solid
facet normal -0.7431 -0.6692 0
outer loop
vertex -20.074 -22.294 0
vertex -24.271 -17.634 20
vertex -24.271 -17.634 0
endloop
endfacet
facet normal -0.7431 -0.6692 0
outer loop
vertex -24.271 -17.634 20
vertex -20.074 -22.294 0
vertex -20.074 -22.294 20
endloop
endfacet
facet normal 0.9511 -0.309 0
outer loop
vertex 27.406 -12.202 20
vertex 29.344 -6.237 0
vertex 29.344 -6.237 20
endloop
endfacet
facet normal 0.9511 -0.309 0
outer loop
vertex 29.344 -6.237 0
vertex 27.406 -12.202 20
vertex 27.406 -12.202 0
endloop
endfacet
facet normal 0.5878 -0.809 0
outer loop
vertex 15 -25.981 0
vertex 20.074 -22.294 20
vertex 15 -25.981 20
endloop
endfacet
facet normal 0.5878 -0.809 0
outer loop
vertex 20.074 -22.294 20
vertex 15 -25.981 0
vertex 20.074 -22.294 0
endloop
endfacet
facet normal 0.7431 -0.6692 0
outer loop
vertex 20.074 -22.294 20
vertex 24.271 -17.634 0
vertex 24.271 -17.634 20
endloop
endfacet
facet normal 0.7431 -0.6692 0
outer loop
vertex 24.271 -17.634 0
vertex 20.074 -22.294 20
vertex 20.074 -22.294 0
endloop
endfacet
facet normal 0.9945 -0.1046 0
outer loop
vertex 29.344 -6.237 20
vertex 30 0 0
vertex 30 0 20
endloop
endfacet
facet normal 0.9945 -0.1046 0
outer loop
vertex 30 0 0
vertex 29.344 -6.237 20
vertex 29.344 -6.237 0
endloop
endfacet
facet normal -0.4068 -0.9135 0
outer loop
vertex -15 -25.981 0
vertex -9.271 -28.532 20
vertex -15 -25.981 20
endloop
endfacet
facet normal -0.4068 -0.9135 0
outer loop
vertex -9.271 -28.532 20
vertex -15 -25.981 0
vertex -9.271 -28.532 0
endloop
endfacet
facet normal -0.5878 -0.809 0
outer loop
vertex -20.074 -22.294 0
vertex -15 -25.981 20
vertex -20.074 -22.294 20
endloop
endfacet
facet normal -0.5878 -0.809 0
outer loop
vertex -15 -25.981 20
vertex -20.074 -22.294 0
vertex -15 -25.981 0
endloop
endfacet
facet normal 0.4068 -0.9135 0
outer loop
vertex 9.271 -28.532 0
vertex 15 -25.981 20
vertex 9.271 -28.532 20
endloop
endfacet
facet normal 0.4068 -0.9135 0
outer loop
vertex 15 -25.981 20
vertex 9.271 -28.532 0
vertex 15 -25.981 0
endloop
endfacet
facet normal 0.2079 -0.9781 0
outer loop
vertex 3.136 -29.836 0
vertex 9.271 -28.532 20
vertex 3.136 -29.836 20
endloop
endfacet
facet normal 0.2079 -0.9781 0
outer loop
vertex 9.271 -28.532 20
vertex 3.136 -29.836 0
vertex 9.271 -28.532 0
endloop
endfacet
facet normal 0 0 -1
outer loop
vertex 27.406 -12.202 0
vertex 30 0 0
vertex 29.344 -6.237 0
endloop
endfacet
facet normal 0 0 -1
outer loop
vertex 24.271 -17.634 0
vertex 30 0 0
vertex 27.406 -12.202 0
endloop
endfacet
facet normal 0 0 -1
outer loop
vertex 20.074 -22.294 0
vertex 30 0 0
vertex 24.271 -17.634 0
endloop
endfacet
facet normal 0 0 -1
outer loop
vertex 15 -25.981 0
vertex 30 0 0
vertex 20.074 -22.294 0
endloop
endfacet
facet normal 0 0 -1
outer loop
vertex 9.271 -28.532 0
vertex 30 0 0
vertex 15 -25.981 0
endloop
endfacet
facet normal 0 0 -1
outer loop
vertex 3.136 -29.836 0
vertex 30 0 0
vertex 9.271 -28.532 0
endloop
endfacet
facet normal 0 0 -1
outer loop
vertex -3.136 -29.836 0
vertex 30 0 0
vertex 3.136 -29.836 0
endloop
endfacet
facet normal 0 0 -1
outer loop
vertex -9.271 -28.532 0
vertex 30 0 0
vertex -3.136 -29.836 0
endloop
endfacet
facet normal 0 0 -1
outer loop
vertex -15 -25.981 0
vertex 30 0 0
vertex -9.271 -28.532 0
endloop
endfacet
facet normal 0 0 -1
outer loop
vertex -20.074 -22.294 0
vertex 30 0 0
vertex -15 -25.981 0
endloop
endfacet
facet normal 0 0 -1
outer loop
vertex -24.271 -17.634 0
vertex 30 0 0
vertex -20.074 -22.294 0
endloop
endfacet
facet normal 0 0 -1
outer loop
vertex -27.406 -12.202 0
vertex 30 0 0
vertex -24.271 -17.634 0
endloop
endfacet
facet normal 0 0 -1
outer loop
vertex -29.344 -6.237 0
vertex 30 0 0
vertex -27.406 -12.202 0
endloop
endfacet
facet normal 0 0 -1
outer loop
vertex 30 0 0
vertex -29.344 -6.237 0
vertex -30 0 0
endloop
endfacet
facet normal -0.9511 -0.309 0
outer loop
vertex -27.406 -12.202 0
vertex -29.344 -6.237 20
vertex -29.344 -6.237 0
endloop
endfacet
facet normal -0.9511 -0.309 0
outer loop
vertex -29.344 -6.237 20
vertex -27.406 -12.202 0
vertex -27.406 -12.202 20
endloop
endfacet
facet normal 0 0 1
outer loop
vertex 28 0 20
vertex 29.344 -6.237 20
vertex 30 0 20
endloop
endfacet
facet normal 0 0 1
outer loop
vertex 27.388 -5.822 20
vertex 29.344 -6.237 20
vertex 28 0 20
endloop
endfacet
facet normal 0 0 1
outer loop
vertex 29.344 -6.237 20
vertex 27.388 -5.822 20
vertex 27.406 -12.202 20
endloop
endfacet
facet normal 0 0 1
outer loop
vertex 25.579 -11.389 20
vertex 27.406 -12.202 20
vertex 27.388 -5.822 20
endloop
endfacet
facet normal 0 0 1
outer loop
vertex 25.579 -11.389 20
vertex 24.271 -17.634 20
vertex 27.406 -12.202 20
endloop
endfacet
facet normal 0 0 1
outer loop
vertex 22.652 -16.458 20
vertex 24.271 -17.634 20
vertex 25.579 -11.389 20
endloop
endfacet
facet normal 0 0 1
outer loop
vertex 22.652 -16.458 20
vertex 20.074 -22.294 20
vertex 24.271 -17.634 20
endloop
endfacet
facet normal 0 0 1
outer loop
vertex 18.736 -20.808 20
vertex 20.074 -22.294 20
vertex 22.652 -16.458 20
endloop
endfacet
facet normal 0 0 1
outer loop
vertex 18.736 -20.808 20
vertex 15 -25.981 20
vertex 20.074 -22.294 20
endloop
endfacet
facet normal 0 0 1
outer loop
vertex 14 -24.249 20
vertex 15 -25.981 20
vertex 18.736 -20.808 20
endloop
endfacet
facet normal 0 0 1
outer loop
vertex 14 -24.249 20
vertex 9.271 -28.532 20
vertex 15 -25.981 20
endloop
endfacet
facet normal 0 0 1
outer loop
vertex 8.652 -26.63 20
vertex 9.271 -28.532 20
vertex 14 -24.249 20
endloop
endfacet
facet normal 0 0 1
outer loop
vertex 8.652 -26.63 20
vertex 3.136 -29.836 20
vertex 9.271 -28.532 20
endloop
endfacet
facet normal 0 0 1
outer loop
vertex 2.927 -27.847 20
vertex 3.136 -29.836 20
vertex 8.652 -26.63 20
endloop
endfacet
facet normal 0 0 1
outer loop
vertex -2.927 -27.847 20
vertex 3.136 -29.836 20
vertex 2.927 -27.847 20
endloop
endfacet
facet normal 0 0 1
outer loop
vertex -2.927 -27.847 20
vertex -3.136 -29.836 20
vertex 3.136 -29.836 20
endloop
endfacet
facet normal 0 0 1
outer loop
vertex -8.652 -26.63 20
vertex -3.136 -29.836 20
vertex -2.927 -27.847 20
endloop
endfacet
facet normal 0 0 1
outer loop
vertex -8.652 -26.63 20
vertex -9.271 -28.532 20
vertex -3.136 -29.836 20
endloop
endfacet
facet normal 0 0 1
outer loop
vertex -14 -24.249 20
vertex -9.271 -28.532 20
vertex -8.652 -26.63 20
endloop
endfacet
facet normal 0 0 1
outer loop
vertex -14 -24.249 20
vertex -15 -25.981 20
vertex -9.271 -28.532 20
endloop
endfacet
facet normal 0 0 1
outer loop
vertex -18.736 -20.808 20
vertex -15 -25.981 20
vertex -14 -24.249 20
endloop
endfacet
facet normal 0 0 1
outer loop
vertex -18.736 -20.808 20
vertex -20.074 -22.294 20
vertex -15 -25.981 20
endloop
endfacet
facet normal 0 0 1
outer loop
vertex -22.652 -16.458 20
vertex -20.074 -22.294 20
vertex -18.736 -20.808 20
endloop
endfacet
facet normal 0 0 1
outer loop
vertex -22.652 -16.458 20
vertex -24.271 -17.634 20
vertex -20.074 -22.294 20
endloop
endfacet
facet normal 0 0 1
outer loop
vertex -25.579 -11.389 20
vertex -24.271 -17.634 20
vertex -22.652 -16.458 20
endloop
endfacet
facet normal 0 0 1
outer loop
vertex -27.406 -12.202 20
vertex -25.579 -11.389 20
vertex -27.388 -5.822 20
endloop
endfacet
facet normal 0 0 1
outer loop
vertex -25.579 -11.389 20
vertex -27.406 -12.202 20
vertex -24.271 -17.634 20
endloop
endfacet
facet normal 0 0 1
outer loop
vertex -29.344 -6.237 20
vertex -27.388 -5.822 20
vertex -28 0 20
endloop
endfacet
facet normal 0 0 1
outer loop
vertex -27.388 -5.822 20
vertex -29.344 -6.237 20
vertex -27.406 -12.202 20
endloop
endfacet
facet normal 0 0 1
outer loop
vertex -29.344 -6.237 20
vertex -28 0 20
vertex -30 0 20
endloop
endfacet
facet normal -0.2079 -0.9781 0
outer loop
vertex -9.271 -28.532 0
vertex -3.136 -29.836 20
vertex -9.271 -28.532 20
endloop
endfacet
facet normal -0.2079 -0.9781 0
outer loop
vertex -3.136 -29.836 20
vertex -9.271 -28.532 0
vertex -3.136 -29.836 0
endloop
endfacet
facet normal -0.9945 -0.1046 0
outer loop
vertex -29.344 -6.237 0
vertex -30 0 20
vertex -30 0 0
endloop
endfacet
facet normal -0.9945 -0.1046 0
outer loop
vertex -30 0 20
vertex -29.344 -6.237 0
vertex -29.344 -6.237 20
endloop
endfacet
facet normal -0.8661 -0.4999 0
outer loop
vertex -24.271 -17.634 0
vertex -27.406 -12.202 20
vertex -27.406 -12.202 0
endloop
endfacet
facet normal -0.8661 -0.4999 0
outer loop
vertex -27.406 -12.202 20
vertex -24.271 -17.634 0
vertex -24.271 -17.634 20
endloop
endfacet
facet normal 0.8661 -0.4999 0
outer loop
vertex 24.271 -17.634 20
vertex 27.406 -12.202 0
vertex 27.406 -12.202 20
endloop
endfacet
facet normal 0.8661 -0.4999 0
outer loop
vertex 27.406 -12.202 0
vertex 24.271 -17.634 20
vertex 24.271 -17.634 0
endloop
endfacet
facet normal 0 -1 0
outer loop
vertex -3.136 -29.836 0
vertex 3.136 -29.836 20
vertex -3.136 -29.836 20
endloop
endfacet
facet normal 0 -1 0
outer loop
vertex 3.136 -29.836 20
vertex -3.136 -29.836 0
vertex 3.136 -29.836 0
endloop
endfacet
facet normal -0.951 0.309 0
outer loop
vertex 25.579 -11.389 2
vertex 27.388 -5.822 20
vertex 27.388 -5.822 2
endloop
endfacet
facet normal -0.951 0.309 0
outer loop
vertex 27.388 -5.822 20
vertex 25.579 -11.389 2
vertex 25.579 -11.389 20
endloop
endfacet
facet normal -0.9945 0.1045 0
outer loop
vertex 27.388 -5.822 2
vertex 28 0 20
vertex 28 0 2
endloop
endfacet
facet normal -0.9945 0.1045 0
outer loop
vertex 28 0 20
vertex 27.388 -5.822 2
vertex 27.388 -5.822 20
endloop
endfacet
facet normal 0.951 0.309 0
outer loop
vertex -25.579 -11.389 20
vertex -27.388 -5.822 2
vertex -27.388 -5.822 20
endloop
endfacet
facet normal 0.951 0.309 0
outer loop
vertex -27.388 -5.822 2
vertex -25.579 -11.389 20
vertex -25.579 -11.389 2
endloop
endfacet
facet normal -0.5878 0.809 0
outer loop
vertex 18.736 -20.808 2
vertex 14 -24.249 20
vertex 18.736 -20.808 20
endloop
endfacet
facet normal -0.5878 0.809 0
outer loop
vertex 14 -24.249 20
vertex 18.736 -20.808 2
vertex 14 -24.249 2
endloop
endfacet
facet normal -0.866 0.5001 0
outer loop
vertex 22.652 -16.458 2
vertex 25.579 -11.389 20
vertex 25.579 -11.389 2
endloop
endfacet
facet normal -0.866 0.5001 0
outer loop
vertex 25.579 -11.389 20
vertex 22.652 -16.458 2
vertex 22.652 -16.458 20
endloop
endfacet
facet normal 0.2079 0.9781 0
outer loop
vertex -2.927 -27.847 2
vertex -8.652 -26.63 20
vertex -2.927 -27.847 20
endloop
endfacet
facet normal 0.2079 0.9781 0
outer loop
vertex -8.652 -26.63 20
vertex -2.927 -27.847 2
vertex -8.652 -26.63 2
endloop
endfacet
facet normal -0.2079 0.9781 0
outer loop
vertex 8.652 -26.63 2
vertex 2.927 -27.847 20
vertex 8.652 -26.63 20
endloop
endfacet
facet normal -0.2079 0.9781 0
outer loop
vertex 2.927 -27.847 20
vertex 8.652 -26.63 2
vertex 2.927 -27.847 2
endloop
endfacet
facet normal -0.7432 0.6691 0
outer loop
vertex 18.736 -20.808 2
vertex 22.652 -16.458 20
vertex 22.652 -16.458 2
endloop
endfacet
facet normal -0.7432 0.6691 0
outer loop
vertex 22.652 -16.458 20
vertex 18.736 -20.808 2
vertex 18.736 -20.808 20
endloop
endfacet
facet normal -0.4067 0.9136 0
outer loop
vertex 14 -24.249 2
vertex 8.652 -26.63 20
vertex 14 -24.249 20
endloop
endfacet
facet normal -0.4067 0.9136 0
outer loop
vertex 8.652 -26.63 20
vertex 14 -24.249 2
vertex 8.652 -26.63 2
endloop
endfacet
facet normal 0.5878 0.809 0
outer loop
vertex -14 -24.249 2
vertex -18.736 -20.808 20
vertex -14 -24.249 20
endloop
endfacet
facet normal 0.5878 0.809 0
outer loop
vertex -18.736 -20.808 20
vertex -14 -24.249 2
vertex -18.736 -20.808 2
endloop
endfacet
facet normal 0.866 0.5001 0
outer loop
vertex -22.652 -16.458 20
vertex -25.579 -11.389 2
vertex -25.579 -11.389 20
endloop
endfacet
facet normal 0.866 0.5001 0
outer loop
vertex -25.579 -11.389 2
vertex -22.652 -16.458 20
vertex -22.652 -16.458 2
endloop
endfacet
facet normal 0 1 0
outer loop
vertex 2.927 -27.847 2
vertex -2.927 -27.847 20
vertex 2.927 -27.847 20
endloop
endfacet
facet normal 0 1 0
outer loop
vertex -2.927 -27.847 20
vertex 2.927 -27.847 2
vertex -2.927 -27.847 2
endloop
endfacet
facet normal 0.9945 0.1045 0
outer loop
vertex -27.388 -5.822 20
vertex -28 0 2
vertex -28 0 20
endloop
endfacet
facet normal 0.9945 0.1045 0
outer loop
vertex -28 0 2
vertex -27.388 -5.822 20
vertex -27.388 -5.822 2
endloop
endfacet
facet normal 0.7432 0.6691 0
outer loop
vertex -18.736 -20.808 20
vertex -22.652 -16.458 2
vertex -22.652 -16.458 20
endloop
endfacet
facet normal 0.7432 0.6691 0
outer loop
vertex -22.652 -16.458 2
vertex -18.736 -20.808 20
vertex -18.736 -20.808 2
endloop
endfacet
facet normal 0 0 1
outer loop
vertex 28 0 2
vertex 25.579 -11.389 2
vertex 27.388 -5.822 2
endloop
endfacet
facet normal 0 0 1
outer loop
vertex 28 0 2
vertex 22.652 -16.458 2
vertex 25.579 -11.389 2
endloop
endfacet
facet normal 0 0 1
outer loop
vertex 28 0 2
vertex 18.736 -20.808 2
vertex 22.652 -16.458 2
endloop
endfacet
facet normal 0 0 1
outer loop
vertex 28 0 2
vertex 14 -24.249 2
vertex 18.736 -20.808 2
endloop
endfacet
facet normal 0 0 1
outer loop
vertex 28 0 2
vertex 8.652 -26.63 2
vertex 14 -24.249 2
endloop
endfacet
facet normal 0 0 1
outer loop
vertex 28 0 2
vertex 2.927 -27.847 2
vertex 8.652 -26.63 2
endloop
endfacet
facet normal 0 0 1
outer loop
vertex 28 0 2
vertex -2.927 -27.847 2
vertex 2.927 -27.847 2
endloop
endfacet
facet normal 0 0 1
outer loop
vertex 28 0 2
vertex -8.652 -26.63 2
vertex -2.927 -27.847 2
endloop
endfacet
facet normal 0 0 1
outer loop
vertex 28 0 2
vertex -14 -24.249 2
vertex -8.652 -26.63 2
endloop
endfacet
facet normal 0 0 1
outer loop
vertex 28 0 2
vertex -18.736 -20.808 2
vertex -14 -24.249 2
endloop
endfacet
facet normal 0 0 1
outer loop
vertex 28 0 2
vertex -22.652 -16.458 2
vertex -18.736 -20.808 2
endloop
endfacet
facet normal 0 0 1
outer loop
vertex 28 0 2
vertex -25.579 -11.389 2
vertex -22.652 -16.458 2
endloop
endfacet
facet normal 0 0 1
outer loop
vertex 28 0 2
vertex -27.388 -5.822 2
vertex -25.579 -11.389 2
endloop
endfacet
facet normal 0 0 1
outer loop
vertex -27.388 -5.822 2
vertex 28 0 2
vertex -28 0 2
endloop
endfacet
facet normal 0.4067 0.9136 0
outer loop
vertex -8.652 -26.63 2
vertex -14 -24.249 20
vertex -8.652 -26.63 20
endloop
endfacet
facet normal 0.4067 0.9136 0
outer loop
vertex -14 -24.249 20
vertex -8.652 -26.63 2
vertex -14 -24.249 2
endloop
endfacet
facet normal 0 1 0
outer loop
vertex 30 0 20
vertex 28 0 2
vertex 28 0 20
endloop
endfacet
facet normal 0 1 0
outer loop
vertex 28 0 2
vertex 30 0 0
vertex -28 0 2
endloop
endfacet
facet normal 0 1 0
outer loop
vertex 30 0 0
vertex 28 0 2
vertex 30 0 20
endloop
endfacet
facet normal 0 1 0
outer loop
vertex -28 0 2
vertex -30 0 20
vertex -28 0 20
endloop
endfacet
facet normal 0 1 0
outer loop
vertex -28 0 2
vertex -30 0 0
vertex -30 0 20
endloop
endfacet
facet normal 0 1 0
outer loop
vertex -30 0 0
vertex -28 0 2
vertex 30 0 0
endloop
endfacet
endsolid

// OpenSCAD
$fn=30;
difference(){
	difference(){
		cylinder(h=20, r=30);
		translate([0,0,2])
			cylinder(h=25,r=28);
	}

	translate([-31,0,-1])
		cube(62);
}
